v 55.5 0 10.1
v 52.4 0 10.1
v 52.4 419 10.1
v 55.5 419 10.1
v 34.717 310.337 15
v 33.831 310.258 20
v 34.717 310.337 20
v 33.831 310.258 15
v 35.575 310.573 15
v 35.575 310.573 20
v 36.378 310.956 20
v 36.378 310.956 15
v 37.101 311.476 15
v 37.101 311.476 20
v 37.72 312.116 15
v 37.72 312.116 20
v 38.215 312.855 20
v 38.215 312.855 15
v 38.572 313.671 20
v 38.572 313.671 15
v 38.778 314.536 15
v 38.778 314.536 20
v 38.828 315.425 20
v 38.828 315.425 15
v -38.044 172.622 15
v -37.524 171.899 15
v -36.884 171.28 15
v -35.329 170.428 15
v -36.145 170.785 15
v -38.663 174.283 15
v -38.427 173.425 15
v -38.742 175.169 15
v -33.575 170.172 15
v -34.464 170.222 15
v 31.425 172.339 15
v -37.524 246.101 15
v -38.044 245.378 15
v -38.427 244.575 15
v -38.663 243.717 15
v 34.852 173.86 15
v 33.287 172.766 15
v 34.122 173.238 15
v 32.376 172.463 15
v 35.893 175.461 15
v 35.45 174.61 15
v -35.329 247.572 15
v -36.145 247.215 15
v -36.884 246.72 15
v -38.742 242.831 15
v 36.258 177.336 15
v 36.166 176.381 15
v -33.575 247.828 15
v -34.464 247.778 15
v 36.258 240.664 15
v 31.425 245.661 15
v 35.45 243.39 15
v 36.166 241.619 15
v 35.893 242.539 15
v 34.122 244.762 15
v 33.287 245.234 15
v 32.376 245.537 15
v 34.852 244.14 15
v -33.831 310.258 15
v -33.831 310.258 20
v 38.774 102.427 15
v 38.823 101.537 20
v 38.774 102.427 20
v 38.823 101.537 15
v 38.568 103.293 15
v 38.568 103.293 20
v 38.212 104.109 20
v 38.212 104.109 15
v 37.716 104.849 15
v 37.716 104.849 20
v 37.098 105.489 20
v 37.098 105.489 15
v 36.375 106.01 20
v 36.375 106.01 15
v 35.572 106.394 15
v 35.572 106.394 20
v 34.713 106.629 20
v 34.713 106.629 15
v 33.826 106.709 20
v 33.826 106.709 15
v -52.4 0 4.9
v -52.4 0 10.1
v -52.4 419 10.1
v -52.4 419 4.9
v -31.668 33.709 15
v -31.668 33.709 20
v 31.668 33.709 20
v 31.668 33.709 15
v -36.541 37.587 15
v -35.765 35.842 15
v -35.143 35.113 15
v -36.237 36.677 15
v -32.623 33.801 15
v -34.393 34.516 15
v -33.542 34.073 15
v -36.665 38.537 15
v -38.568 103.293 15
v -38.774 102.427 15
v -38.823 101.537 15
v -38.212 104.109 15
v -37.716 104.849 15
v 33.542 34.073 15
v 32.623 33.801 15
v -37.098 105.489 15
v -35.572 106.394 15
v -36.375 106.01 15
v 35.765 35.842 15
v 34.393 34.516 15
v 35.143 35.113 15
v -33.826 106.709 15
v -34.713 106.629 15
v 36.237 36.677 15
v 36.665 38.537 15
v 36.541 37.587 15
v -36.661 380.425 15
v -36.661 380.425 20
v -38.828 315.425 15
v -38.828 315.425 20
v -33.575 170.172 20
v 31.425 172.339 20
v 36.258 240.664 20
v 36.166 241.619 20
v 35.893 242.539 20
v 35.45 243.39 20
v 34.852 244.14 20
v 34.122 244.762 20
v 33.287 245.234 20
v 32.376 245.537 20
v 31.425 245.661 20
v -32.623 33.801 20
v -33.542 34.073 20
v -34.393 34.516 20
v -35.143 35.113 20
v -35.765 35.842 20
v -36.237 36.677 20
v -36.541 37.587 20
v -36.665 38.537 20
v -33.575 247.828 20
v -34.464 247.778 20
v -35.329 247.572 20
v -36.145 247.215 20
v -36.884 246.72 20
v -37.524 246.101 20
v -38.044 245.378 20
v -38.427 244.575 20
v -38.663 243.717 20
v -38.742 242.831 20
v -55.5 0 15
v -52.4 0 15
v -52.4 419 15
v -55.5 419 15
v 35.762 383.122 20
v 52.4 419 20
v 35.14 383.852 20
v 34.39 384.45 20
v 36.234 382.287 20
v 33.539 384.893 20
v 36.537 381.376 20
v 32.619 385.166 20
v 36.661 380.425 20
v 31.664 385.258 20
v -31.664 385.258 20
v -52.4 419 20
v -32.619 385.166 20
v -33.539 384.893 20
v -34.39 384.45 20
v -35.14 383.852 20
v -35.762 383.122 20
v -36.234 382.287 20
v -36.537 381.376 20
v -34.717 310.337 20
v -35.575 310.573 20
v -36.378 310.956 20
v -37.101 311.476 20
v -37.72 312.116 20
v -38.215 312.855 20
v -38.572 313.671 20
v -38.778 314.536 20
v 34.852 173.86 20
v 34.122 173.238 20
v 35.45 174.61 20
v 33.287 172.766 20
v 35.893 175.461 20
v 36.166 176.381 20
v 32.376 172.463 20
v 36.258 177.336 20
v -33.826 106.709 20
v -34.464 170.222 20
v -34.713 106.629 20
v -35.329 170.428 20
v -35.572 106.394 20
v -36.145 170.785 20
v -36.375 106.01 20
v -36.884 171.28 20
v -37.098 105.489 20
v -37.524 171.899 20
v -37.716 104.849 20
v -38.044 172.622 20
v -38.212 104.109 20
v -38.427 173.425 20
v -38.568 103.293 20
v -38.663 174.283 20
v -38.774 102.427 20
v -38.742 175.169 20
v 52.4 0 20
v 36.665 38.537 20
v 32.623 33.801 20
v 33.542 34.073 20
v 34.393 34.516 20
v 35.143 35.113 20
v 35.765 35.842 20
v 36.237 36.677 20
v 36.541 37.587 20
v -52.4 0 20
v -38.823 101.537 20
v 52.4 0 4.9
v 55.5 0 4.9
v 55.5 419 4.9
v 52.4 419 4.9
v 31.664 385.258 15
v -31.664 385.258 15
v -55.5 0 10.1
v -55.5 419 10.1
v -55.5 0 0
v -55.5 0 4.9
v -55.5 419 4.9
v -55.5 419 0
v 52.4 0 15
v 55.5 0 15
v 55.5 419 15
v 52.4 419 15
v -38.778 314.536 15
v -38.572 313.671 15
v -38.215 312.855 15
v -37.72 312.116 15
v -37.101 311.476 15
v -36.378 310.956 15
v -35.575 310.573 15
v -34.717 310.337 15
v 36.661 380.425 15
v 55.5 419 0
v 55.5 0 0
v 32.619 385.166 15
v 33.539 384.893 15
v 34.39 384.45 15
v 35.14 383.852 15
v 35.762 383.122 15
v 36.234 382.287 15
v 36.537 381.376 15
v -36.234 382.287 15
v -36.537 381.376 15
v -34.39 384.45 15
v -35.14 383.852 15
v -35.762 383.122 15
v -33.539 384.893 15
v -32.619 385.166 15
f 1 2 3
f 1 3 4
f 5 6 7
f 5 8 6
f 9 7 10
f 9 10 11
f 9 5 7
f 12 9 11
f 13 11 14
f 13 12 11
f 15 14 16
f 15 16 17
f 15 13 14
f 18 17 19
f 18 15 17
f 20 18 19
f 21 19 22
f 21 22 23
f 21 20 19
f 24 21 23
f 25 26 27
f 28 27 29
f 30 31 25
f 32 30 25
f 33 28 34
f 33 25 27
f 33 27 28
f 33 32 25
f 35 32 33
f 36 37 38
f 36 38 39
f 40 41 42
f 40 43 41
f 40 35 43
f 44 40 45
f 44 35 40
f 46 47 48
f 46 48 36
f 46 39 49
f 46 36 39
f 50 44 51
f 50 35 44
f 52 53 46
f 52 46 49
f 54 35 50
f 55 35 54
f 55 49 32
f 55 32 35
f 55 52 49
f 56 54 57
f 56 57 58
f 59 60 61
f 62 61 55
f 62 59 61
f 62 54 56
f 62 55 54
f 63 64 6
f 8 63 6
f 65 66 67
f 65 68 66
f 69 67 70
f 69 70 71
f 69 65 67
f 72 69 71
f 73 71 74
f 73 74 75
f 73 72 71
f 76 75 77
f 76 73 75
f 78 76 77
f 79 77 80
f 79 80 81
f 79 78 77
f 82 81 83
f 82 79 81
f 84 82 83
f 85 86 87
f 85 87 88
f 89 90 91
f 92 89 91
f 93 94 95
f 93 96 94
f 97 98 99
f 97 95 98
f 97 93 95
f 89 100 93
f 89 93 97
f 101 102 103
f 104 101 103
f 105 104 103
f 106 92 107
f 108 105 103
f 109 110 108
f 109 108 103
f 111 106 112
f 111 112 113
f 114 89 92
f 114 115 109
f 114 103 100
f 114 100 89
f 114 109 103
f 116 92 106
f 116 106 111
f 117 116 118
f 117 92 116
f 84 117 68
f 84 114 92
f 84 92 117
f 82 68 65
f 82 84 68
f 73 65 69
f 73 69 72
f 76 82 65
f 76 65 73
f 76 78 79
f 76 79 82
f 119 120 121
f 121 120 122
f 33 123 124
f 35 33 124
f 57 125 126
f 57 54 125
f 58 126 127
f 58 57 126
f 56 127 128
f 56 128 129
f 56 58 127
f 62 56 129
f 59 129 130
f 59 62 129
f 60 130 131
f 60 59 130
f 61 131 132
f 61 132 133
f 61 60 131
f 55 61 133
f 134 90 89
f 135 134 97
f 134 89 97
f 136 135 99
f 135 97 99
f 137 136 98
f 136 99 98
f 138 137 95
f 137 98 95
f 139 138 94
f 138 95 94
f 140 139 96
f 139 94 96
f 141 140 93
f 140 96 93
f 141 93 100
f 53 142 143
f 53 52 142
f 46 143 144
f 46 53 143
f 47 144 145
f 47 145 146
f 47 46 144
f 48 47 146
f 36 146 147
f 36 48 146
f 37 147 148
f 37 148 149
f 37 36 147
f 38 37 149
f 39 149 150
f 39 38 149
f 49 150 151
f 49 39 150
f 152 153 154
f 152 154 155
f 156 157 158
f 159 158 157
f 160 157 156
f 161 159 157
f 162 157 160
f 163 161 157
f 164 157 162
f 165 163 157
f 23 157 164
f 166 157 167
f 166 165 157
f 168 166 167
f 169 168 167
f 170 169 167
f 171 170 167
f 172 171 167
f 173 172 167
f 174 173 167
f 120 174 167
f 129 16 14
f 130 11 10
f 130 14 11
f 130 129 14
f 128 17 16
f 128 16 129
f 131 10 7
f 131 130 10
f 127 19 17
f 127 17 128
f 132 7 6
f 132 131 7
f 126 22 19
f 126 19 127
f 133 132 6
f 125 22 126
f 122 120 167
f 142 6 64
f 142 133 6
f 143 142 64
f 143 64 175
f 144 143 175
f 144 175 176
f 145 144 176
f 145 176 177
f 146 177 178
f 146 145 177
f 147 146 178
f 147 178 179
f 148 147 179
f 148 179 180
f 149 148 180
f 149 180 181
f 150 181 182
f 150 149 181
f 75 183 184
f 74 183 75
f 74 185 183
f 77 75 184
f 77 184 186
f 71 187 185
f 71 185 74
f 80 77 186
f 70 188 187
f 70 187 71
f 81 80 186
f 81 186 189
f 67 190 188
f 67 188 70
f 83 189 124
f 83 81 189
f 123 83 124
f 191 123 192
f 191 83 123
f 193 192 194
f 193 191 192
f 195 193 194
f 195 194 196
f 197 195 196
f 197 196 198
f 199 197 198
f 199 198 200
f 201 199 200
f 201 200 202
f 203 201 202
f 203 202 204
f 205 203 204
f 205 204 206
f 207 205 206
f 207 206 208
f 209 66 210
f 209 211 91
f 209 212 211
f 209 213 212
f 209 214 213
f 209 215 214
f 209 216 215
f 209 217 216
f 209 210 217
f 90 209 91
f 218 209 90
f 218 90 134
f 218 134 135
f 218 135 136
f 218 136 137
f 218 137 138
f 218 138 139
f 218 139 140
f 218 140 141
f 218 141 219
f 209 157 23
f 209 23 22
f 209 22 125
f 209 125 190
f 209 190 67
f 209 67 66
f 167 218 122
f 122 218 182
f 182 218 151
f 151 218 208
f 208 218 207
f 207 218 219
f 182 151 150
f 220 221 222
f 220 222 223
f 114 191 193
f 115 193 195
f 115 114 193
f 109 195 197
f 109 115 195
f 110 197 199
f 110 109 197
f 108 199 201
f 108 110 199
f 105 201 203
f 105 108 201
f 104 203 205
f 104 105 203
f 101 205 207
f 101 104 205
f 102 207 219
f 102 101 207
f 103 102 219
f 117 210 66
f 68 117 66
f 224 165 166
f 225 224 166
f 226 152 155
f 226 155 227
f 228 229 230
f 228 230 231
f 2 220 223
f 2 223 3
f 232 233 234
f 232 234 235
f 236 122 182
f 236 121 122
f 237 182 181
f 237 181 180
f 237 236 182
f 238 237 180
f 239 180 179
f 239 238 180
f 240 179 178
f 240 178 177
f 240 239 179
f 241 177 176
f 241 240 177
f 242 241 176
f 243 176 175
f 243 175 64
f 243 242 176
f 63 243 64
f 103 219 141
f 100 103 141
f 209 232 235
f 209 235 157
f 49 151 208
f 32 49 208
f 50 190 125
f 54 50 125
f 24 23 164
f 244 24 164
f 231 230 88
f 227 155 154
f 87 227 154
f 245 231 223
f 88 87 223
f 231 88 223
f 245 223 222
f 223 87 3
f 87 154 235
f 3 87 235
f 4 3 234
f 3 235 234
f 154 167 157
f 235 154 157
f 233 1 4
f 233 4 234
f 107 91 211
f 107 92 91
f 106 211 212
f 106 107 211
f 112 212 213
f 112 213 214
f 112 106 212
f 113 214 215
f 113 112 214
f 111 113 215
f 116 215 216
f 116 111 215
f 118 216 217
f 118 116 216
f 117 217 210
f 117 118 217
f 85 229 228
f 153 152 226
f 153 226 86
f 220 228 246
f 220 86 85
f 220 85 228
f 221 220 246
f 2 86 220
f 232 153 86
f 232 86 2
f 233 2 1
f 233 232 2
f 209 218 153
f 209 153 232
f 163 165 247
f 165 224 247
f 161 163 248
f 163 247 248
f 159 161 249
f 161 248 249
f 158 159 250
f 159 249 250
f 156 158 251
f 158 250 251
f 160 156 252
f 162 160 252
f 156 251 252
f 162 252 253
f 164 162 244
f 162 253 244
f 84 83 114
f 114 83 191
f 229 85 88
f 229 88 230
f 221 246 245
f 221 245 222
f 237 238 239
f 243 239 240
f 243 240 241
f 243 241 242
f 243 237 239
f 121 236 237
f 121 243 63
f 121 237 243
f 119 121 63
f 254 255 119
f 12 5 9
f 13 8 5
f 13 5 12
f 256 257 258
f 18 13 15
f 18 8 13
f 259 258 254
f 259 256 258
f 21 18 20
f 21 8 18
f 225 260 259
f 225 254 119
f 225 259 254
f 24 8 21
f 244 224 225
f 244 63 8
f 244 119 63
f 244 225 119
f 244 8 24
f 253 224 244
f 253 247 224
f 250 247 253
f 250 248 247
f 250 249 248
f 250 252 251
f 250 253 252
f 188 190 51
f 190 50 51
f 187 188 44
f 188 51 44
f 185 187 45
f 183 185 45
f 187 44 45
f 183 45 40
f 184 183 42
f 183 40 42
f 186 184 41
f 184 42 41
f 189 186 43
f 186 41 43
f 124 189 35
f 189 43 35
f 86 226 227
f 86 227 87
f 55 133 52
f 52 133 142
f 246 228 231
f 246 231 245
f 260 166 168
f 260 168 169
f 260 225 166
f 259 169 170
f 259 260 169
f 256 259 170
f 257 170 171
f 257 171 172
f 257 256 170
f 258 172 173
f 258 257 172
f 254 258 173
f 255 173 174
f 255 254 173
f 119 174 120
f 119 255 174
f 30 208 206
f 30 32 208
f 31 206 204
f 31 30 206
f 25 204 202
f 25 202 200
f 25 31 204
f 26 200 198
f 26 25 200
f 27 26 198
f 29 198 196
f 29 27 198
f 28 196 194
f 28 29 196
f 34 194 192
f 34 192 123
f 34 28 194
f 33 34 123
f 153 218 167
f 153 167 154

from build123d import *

# Parameters (mm, degrees)
F1_DEPTH = 419
F3_DEPTH = 5
F4_R     = 5


with BuildPart() as f1:
    # F0 (on Front) → F1 (new body)
    with BuildSketch(Plane.XZ):
        Polygon((-55.5, 0), (0, 0), (55.5, 0), (55.5, 4.9), (52.4, 4.9), (52.4, 10.1), (55.5, 10.1), (55.5, 15), (52.4, 15), (52.4, 20), (0, 20), (-52.4, 20), (-52.4, 15), (-55.5, 15), (-55.5, 10.1), (-52.4, 10.1), (-52.4, 4.9), (-55.5, 4.9), align=None)
    extrude(amount=-F1_DEPTH)

    # F2 (on face) → F3 (cut)
    with BuildSketch(Plane.XY.offset(20)):
        Polygon((36.5, 385.258278), (-36.5, 385.258278), (-39, 310.258278), (39, 310.258278), align=None)
        Polygon((-36.5, 33.708609), (36.5, 33.708609), (39, 106.708609), (-39, 106.708609), align=None)
        Polygon((36.258278, 172.5), (36.258278, 245.5), (-38.741722, 248), (-38.741722, 170), align=None)
    extrude(amount=-F3_DEPTH, mode=Mode.SUBTRACT)

    # F4
    f4_edges = [f1.edges().sort_by_distance(p)[0] for p in [
        (-36.5, 385.258278, 17.5),
        (36.5, 385.258278, 17.5),
        (-39, 310.258278, 17.5),
        (39, 310.258278, 17.5),
        (-38.741722, 248, 17.5),
        (36.258278, 245.5, 17.5),
        (39, 106.708609, 17.5),
        (-39, 106.708609, 17.5),
        (-38.741722, 170, 17.5),
        (36.258278, 172.5, 17.5),
        (36.5, 33.708609, 17.5),
        (-36.5, 33.708609, 17.5),
    ]]
    fillet(f4_edges, radius=F4_R)


solid = f1.part
